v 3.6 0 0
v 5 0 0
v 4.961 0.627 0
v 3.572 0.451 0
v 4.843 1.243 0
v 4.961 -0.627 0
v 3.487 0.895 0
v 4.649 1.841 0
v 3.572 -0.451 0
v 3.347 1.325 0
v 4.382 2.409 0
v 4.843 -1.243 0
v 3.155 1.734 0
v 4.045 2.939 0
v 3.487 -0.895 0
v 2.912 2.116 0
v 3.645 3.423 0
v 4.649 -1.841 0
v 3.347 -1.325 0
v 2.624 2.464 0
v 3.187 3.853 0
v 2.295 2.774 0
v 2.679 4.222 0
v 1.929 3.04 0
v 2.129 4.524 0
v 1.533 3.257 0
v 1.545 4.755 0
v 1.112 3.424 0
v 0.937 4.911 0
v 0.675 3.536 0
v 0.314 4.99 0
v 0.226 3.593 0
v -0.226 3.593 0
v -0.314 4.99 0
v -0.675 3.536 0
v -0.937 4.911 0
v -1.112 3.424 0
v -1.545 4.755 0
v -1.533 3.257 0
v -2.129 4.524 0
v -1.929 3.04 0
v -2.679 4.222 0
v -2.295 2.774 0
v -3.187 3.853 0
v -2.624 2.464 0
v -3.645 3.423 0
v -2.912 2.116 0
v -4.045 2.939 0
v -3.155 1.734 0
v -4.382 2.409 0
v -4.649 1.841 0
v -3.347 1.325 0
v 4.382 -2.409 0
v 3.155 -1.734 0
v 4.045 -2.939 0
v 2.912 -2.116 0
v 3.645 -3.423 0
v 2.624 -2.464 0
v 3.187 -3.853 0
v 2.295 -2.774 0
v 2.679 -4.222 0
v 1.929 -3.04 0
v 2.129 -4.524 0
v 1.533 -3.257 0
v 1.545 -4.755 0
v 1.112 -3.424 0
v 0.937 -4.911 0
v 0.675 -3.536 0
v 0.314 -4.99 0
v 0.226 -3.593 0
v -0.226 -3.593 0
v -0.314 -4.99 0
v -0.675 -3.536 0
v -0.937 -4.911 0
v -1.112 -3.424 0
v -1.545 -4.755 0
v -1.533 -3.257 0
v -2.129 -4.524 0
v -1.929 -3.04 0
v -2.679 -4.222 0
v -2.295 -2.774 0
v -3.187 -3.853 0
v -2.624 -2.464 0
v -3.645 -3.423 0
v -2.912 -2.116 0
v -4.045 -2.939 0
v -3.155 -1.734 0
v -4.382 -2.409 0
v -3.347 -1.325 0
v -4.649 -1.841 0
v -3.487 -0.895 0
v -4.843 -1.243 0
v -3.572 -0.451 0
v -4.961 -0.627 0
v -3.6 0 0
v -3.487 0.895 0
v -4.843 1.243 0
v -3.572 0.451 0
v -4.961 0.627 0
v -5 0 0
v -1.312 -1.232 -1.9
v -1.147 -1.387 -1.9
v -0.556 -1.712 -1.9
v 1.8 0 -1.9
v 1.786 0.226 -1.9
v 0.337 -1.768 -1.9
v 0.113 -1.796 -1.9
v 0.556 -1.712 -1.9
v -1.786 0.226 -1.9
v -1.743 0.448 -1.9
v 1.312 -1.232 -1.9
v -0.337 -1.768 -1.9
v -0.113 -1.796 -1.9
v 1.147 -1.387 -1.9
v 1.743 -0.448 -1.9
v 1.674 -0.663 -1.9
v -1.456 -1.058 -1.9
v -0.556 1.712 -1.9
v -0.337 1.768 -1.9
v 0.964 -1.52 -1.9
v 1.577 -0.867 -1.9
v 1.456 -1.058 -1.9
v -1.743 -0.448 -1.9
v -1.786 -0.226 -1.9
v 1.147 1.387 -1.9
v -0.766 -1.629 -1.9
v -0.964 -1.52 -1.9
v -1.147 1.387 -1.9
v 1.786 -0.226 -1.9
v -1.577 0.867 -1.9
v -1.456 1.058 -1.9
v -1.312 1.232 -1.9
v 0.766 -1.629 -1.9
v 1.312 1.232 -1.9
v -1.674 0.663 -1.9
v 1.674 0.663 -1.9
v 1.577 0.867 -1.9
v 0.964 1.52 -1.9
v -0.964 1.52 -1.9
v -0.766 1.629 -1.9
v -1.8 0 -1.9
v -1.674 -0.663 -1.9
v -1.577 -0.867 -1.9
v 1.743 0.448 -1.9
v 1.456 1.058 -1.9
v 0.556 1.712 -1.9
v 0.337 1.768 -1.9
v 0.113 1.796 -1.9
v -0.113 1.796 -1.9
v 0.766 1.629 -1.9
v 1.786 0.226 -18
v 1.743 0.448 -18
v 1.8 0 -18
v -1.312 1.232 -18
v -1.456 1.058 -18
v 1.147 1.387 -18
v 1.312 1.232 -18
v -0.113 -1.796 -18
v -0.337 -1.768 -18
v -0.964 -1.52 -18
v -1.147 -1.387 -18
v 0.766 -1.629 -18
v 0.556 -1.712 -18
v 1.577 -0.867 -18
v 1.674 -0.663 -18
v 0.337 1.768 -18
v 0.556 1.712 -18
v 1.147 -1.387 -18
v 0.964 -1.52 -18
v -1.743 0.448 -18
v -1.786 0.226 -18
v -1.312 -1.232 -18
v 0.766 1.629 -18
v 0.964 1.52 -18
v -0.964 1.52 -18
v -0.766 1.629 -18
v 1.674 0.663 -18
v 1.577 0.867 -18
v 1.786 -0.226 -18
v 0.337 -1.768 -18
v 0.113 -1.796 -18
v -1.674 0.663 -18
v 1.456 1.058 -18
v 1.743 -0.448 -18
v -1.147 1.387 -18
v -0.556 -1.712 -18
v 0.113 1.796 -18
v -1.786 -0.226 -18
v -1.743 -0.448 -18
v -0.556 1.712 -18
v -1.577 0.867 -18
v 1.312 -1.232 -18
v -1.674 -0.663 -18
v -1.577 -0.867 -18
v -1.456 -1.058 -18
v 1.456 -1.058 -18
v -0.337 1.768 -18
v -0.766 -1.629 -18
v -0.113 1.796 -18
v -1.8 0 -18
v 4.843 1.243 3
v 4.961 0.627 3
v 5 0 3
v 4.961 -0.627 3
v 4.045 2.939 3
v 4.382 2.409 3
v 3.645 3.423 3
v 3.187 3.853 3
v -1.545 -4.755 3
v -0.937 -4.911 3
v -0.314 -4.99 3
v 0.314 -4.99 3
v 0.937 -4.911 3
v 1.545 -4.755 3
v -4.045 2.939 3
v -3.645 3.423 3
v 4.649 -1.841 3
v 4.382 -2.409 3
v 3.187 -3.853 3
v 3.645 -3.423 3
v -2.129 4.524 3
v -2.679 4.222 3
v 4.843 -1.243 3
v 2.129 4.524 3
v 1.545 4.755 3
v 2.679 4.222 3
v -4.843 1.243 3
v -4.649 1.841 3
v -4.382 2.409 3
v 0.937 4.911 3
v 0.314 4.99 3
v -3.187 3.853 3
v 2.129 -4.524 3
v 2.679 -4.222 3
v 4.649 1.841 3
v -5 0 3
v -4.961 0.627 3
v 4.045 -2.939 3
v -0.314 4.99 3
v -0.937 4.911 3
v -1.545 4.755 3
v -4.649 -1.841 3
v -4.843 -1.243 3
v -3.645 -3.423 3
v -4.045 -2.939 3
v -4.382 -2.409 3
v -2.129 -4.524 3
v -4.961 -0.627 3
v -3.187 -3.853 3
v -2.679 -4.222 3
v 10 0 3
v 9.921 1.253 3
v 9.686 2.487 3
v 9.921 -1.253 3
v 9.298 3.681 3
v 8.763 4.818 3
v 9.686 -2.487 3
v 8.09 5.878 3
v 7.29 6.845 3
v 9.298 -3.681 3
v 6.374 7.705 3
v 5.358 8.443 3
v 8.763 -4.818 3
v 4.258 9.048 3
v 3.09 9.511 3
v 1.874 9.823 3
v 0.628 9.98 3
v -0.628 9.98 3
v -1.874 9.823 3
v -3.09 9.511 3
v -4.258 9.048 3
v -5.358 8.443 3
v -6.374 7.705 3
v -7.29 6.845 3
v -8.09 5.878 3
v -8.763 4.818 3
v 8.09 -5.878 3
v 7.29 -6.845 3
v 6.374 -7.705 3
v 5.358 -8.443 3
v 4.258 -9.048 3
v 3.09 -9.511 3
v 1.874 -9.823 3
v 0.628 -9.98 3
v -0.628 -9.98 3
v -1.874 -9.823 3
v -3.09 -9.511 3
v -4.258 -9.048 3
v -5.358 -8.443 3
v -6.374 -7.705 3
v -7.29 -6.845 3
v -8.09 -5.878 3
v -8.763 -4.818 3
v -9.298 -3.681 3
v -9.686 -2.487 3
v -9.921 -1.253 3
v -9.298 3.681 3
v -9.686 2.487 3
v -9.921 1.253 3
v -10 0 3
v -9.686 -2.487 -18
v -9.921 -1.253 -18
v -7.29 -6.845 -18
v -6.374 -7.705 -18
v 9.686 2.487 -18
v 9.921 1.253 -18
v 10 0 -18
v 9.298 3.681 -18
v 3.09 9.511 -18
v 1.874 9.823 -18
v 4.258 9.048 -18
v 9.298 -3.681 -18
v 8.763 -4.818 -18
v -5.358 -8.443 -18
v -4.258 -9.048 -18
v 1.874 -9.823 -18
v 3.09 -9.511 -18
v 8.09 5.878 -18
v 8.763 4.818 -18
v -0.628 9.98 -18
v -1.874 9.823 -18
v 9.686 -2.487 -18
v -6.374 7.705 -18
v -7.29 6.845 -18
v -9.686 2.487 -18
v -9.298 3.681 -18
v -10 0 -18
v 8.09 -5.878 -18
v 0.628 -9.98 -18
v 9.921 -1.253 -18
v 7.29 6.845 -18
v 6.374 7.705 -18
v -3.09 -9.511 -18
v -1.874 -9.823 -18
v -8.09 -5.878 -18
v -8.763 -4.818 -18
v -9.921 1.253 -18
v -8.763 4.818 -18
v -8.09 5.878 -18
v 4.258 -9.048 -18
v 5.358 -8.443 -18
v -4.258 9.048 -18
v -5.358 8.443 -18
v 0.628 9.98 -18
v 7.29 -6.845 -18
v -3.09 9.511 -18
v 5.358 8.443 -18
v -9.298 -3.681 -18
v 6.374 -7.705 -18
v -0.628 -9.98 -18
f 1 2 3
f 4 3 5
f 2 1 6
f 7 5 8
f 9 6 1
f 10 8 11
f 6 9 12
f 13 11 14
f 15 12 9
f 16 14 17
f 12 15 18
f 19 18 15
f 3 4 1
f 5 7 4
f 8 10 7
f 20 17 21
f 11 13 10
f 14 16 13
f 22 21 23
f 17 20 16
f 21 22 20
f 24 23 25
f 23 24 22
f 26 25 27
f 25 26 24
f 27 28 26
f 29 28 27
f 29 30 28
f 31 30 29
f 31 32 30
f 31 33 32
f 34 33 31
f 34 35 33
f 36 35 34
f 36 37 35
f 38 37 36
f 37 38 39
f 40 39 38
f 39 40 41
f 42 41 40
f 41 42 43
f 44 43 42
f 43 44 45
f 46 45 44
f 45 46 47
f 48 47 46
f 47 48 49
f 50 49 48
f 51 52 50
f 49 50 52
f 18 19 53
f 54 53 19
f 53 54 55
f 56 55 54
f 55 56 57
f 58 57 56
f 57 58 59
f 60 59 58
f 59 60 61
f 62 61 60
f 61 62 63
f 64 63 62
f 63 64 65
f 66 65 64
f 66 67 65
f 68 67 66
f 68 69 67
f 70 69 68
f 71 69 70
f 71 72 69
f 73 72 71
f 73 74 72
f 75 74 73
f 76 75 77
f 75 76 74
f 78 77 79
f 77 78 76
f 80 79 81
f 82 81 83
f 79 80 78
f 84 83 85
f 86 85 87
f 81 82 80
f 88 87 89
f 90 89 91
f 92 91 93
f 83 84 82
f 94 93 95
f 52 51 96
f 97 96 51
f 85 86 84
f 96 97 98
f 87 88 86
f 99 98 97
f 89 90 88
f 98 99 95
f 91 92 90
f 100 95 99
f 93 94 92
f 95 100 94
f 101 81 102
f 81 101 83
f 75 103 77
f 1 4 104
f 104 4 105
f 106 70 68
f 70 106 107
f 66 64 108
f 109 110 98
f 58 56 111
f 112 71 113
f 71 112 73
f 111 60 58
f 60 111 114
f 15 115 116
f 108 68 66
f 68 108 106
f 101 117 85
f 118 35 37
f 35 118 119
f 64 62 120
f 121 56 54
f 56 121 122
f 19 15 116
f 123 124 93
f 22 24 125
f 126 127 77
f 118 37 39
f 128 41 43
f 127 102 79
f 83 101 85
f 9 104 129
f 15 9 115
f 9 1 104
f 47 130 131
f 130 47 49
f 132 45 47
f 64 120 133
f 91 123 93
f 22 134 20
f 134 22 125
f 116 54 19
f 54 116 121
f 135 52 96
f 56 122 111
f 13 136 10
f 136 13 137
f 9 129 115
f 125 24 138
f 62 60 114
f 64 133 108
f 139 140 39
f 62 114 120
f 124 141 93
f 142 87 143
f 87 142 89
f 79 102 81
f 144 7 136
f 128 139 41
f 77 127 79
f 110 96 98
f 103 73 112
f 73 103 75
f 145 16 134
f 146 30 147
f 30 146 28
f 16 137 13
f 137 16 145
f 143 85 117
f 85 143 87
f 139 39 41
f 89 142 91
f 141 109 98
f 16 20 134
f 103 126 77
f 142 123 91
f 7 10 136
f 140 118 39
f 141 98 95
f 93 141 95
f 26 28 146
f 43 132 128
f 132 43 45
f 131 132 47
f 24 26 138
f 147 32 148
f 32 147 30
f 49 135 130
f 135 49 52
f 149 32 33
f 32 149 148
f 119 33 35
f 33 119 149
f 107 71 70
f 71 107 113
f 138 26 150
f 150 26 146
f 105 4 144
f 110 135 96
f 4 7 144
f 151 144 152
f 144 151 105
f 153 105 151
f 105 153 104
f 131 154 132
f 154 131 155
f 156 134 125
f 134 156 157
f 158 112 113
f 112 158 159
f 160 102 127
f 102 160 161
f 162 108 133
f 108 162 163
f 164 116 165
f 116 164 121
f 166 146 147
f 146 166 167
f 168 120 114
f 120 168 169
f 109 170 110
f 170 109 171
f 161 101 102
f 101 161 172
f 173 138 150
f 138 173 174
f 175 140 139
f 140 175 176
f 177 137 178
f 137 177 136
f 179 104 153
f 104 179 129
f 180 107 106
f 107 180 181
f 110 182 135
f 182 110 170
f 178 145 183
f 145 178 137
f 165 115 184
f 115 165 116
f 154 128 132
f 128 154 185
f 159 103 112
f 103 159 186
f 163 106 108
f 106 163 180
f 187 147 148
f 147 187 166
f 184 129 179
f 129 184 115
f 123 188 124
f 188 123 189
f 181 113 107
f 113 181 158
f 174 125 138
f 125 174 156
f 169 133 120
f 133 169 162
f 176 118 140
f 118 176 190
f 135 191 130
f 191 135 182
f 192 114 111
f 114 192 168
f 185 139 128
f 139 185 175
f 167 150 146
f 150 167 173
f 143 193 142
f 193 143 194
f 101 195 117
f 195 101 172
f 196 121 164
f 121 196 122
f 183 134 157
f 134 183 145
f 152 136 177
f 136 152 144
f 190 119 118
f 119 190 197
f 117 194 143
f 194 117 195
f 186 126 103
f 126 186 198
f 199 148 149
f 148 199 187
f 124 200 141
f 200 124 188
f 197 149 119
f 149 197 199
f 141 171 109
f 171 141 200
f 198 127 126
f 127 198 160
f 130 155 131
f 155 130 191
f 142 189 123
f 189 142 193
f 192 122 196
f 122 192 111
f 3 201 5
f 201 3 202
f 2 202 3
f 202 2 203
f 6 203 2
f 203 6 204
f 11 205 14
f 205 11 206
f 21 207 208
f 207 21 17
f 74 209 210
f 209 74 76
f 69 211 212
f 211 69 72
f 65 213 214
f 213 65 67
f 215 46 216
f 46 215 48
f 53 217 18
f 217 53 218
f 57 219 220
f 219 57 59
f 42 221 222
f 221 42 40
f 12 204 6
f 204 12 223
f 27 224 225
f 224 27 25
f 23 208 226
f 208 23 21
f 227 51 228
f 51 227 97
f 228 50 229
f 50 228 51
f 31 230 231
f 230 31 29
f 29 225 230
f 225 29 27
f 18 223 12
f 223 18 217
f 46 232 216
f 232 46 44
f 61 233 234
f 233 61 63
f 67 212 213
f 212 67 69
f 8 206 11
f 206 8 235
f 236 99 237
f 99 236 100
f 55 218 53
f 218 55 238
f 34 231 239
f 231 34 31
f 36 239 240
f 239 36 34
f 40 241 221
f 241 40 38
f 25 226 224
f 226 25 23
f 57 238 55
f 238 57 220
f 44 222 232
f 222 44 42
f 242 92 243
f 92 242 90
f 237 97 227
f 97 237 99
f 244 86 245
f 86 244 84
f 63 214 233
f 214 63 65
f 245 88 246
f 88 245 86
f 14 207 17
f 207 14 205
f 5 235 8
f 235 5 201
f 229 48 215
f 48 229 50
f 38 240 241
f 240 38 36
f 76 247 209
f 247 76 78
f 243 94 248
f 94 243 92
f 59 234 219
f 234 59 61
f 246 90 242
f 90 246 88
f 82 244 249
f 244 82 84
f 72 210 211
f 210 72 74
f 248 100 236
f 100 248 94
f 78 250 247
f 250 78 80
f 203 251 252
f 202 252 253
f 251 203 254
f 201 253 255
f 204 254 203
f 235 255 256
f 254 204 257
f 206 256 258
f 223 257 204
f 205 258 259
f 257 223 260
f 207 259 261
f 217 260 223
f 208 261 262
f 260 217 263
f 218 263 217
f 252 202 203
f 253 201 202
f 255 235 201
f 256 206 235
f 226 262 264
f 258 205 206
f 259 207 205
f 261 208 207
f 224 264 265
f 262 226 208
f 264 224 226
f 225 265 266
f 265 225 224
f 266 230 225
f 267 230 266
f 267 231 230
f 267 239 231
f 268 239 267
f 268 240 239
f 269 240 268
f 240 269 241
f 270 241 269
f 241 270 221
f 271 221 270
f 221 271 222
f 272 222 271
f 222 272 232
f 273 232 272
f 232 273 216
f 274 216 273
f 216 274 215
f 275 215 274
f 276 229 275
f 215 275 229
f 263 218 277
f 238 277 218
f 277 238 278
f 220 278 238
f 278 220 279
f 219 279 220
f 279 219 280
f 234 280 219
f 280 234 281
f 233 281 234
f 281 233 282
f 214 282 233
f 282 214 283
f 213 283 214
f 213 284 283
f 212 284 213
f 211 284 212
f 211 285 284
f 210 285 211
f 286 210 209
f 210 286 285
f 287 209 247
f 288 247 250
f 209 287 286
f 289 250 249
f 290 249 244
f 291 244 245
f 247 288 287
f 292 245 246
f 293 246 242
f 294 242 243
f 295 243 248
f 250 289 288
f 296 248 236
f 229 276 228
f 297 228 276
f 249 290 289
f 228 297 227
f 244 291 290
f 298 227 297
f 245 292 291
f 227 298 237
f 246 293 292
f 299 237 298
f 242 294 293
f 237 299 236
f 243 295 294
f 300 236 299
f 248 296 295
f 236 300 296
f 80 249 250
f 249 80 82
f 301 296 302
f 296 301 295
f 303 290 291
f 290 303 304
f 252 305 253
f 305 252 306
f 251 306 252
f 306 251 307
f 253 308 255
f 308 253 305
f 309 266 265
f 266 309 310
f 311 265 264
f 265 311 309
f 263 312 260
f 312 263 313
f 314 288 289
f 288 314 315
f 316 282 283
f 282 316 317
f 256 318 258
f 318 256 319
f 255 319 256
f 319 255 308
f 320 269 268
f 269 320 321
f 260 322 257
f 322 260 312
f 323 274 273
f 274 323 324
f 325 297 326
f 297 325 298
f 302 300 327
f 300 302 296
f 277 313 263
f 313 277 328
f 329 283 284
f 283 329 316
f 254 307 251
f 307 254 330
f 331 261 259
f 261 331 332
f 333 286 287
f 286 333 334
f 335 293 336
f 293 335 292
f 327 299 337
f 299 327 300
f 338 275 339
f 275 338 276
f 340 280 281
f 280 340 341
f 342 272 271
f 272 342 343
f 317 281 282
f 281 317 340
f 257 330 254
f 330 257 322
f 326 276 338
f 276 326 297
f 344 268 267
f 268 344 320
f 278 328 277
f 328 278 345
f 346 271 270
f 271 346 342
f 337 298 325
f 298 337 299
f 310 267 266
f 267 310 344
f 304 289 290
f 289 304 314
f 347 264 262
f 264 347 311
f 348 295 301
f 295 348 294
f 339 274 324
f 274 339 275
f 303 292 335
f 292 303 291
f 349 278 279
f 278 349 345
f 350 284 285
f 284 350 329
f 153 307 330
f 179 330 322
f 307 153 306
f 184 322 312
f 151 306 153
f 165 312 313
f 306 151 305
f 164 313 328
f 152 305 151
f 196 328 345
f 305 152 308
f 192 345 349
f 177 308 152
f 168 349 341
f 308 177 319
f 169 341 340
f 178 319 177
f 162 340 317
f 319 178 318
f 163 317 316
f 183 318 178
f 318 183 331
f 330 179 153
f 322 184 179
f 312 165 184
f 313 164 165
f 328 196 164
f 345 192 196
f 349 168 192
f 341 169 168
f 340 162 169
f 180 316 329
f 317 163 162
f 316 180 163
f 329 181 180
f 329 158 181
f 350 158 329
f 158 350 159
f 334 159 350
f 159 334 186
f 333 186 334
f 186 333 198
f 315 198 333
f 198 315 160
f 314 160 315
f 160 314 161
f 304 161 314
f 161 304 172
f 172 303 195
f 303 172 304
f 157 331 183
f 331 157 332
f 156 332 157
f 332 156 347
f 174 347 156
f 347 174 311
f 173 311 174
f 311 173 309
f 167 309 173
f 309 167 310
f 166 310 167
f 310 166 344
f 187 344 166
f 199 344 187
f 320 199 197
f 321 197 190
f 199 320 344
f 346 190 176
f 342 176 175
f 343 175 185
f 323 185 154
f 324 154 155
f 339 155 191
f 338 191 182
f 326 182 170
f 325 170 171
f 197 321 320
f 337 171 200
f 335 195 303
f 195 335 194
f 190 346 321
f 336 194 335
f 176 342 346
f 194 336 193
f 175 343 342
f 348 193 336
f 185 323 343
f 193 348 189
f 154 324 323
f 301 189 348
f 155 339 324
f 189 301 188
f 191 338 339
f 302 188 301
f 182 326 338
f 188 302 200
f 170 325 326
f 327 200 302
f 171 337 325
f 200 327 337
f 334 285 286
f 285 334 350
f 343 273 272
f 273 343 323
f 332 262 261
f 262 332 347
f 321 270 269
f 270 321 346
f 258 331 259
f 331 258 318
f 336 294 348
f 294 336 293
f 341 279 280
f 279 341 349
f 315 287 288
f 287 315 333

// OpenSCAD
$fn = 50;

difference() {
	union() {
		translate(v = [0, 0, -18.0]) {
			cylinder(h = 21, r = 10.0);
		}
	}
	union() {
		translate(v = [0, 0, 0]) {
			rotate(a = [0, 0, 0]) {
				difference() {
					union() {
						translate(v = [0, 0, -21.0]) {
							cylinder(h = 21, r = 1.5);
						}
						translate(v = [0, 0, -1.9]) {
							cylinder(h = 1.9, r1 = 1.8, r2 = 3.6);
						}
						translate(v = [0, 0, -21.0]) {
							cylinder(h = 21, r = 1.8);
						}
						translate(v = [0, 0, -21.0]) {
							cylinder(h = 21, r = 1.5);
						}
					}
					union();
				}
			}
		}
		#cylinder(h = 3, r = 5.0);
	}
}
